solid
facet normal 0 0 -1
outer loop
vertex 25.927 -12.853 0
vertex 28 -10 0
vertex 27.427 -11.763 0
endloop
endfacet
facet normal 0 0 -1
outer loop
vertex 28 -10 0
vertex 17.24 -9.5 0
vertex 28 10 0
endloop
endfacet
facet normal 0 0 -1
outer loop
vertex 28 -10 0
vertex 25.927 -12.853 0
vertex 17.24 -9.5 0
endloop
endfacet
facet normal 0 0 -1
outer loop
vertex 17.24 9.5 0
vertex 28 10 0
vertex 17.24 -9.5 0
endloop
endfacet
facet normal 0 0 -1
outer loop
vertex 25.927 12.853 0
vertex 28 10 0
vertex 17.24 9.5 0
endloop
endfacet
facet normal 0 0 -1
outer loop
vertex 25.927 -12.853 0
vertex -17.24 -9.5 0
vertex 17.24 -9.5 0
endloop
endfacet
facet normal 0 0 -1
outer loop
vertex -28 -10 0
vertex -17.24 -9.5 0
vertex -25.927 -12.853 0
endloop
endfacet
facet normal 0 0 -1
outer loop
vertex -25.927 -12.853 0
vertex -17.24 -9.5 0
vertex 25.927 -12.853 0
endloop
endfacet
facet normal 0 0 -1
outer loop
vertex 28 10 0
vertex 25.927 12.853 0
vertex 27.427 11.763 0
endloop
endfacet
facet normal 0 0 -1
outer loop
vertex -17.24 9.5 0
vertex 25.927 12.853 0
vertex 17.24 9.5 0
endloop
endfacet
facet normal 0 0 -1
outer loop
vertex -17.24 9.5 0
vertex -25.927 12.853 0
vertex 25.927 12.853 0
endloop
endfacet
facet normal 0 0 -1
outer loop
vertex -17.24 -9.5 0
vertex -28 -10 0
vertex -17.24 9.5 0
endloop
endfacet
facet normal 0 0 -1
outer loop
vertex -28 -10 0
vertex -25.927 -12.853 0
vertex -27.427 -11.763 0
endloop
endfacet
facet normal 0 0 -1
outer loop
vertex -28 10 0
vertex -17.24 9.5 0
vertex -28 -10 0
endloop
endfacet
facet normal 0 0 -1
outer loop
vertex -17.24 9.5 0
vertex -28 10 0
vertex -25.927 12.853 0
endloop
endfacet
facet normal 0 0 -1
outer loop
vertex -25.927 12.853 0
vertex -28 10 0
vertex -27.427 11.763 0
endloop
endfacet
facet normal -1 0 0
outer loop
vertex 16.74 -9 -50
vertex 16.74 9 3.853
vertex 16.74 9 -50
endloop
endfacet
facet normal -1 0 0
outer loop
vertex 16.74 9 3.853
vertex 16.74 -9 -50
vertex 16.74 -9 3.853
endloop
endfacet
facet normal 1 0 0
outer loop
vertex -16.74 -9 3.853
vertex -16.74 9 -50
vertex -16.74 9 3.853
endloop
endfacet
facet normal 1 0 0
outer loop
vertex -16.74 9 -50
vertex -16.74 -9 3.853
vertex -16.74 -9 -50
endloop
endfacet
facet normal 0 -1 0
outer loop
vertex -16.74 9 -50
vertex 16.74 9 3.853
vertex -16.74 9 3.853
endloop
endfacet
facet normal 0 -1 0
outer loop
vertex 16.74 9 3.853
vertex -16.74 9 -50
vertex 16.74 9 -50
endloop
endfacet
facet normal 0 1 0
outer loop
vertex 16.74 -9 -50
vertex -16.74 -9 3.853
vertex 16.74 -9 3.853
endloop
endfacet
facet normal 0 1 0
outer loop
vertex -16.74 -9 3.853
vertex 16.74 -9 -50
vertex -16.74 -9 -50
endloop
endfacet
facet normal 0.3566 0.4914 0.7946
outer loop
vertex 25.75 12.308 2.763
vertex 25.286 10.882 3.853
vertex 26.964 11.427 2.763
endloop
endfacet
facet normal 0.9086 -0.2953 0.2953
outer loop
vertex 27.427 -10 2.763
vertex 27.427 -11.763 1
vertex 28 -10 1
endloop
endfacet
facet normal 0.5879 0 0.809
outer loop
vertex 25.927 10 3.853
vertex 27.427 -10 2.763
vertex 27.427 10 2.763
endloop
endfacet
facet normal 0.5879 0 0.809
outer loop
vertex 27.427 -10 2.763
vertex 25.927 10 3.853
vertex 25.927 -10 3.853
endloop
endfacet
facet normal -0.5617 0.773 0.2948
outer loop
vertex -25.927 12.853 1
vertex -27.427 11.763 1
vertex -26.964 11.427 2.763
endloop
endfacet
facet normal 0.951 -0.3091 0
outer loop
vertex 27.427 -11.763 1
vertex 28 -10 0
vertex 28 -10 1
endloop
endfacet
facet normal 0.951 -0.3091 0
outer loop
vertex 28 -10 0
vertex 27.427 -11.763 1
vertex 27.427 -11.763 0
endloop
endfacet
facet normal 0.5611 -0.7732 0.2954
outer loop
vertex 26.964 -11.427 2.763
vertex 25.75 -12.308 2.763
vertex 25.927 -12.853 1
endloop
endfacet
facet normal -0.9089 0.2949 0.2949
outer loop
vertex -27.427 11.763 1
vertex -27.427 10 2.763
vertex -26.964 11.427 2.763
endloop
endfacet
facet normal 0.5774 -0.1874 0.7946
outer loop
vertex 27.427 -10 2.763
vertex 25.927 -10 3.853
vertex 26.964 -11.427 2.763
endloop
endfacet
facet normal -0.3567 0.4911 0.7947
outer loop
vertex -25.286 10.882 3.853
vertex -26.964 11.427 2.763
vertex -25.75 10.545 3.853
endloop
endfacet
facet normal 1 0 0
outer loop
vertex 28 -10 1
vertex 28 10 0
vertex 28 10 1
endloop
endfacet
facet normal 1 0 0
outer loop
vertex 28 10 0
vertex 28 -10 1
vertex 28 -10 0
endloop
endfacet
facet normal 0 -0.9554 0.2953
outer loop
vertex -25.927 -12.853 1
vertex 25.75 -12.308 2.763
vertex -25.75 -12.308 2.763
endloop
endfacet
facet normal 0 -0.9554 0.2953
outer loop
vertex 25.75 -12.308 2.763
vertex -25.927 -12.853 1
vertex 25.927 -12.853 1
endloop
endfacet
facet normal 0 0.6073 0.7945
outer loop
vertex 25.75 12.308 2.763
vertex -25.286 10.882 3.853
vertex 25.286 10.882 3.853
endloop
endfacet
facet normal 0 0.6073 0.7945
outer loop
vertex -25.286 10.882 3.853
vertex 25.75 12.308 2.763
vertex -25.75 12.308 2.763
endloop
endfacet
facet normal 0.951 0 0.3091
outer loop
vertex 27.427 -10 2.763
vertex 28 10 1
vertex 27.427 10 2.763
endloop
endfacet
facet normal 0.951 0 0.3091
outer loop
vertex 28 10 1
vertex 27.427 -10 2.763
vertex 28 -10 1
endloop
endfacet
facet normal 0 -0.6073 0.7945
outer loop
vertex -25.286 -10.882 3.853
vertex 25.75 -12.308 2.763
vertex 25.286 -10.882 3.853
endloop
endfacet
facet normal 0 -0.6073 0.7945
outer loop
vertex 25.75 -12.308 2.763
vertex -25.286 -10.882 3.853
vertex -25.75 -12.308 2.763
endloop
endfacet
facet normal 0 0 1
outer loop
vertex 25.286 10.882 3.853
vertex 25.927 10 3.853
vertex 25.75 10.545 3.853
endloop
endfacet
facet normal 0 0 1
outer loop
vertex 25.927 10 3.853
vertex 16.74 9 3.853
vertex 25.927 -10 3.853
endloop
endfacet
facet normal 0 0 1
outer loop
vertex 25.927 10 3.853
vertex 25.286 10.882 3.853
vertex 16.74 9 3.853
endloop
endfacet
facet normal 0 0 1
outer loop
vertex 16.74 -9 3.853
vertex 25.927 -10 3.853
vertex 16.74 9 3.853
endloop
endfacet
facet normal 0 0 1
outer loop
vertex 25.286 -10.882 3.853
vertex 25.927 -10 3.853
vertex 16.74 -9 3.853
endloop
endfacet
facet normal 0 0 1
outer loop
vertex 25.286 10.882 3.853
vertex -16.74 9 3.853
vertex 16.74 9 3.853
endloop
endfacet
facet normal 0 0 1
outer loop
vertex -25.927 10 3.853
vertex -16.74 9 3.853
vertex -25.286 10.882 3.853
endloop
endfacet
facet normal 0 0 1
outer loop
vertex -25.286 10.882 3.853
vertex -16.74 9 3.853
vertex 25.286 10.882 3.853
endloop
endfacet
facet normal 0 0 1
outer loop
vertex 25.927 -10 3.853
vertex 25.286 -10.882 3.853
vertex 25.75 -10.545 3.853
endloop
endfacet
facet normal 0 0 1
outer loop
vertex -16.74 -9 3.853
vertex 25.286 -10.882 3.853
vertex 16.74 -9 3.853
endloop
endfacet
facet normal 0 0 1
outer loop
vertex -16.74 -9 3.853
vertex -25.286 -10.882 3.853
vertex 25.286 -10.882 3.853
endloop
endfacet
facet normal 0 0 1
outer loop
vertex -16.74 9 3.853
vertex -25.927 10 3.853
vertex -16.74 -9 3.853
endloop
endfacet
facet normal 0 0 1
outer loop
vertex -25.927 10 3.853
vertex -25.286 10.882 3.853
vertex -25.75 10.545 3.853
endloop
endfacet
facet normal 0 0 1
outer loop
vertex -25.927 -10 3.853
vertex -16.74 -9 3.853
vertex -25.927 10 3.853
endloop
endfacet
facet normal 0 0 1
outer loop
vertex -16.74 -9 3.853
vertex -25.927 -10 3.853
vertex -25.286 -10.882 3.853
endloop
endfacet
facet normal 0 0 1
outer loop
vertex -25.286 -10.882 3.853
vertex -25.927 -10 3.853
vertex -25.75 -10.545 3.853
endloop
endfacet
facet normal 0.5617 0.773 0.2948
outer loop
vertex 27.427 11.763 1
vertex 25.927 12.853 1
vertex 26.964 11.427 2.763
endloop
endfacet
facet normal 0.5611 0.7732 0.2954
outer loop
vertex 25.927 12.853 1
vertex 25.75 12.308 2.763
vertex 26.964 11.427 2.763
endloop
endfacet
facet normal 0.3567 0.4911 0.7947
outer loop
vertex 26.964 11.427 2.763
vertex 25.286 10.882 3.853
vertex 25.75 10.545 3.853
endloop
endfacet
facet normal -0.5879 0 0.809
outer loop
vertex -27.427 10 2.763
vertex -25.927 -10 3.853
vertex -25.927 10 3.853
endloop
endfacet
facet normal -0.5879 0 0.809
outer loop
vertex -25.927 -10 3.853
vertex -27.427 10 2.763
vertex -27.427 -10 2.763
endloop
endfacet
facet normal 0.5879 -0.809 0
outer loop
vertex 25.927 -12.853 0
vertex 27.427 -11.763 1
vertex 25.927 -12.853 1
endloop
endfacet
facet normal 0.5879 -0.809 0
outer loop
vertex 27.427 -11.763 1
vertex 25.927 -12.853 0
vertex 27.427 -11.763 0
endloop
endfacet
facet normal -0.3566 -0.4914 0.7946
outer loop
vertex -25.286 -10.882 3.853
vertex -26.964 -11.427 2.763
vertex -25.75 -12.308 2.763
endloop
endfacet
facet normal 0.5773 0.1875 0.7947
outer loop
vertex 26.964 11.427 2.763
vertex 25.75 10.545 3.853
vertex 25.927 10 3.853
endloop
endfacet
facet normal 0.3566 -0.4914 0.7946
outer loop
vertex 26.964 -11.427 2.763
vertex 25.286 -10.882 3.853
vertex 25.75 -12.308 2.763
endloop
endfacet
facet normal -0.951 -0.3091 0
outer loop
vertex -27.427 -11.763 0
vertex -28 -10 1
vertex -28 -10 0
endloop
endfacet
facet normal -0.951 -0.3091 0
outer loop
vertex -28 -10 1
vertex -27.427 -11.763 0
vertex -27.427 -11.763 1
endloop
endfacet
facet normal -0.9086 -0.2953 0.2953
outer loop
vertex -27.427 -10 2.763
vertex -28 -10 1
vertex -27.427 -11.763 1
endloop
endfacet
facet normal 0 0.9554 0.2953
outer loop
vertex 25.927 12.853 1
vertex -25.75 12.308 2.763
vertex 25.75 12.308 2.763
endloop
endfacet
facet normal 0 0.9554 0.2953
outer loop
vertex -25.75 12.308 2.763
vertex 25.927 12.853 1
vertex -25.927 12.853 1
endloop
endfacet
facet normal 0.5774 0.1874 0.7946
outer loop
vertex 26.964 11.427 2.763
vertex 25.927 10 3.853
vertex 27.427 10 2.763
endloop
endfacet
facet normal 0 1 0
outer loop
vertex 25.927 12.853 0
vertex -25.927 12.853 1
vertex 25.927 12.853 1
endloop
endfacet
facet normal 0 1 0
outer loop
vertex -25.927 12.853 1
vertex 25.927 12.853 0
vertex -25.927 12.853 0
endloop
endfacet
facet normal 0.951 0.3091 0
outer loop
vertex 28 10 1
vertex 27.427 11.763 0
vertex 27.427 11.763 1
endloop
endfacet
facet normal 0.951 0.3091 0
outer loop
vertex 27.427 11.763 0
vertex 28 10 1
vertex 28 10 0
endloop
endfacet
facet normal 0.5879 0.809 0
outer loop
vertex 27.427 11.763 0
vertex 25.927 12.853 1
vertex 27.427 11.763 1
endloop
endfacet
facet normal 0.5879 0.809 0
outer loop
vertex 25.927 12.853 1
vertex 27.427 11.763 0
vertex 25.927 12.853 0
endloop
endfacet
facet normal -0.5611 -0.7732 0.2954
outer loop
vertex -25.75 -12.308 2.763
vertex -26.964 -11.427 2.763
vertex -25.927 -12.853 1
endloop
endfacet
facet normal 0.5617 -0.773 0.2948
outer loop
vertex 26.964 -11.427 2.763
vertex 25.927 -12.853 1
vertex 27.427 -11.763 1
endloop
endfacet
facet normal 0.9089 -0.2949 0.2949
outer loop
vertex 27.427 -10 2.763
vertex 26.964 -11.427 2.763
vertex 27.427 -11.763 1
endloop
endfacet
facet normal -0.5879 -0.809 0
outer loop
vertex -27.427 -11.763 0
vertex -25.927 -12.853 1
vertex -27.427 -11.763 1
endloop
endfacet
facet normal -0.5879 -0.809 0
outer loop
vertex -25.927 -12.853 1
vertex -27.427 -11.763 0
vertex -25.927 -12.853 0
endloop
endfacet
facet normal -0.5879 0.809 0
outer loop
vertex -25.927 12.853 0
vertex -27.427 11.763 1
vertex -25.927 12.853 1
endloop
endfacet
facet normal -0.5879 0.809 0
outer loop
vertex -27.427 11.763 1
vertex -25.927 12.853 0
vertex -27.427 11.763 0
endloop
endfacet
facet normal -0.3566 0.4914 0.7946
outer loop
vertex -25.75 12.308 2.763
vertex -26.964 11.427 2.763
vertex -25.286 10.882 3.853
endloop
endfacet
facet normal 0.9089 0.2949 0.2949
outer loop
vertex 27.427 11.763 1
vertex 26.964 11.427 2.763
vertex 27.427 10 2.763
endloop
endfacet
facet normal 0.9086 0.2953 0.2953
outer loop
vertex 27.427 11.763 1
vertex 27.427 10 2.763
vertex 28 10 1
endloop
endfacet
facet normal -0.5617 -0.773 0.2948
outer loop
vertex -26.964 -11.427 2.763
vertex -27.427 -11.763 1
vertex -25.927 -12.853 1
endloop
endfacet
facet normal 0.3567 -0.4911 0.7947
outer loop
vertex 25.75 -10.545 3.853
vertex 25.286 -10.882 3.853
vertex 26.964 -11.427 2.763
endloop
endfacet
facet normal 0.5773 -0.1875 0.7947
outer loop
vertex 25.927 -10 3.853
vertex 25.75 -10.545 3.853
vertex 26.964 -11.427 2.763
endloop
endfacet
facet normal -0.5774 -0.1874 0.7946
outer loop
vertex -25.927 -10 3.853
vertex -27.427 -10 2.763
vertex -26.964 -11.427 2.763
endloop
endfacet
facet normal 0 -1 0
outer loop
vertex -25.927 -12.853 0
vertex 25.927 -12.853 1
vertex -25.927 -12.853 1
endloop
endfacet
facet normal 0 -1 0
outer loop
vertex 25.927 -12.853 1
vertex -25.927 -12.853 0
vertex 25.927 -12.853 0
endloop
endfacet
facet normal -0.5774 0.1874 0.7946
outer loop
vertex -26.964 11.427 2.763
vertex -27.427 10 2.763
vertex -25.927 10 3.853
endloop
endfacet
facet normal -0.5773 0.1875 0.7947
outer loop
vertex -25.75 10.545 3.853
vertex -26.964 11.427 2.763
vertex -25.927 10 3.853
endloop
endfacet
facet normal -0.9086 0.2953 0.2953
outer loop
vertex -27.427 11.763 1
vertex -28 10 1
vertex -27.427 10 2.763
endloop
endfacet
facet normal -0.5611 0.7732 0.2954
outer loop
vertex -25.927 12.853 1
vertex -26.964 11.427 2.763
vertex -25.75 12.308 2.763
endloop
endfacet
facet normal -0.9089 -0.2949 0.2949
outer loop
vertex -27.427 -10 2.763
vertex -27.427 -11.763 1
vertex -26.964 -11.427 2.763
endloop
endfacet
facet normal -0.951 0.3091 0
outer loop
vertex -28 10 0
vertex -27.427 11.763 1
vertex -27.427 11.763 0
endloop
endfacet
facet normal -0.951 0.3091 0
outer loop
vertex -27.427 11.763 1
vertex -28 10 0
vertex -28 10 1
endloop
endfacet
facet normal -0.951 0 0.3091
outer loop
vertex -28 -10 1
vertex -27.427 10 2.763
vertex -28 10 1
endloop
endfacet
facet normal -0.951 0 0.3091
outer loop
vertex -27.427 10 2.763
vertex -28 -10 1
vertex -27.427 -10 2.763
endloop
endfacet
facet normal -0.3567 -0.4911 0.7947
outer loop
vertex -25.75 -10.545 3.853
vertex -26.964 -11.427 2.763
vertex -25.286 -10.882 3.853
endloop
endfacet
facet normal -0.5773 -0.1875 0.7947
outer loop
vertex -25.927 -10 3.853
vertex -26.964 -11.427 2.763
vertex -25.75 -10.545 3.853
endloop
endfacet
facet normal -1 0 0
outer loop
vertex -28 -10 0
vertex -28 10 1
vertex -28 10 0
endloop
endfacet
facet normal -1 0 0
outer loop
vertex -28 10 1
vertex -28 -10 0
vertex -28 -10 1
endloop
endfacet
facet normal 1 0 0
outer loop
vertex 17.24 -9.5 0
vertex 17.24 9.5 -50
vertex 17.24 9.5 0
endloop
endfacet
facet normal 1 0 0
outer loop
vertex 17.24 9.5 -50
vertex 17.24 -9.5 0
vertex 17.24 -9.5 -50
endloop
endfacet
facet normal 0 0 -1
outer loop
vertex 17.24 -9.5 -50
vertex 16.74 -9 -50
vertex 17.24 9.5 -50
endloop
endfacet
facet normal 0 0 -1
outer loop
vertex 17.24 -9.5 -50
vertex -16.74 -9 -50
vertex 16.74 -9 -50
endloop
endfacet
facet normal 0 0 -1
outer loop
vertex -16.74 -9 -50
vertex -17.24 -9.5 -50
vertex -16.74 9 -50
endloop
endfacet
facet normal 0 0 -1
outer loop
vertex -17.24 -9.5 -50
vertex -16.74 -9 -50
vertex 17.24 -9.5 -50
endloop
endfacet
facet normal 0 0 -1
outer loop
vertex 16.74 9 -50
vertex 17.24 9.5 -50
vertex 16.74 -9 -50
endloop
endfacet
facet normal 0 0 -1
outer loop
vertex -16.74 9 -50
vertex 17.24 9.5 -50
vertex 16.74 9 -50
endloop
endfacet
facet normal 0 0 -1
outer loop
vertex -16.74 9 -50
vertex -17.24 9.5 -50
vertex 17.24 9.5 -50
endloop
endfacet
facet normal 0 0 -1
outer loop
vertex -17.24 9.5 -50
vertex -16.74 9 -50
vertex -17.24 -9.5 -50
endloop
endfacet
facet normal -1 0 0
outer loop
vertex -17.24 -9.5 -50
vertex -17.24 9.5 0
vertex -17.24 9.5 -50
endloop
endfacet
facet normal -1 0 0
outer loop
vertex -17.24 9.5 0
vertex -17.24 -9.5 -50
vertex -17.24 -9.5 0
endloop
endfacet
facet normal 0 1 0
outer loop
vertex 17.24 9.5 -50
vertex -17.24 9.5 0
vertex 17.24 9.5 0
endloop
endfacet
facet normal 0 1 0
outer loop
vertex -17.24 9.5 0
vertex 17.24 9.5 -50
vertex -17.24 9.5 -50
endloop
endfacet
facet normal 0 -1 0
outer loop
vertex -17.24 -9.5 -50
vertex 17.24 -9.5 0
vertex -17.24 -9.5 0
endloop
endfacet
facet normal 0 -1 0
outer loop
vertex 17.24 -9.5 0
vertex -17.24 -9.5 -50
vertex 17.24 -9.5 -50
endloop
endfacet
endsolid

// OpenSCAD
// rj45 dimensions

rj_width=15.24;
rj_height=15;

plate_width=25 * 2;
plate_height=20;
plate_thick=2;

difference(){
	union(){
		minkowski(){
			cube([plate_width, plate_height, plate_thick], center=true);
			sphere(3);
		}
	}
	union(){
		translate([-100, -100, -100]){
			cube([200, 200, 100]);
		}
		cube([rj_width * 2 + 3, rj_height + 3, 300], center=true);
	}
}
difference(){
	translate([-(rj_width * 2 + 4) / 2, -(rj_height + 4) / 2, -50]){
		cube([rj_width * 2 + 4, rj_height + 4, 50]);
	}
	cube([rj_width * 2 + 3, rj_height + 3, 300], center=true);
}
